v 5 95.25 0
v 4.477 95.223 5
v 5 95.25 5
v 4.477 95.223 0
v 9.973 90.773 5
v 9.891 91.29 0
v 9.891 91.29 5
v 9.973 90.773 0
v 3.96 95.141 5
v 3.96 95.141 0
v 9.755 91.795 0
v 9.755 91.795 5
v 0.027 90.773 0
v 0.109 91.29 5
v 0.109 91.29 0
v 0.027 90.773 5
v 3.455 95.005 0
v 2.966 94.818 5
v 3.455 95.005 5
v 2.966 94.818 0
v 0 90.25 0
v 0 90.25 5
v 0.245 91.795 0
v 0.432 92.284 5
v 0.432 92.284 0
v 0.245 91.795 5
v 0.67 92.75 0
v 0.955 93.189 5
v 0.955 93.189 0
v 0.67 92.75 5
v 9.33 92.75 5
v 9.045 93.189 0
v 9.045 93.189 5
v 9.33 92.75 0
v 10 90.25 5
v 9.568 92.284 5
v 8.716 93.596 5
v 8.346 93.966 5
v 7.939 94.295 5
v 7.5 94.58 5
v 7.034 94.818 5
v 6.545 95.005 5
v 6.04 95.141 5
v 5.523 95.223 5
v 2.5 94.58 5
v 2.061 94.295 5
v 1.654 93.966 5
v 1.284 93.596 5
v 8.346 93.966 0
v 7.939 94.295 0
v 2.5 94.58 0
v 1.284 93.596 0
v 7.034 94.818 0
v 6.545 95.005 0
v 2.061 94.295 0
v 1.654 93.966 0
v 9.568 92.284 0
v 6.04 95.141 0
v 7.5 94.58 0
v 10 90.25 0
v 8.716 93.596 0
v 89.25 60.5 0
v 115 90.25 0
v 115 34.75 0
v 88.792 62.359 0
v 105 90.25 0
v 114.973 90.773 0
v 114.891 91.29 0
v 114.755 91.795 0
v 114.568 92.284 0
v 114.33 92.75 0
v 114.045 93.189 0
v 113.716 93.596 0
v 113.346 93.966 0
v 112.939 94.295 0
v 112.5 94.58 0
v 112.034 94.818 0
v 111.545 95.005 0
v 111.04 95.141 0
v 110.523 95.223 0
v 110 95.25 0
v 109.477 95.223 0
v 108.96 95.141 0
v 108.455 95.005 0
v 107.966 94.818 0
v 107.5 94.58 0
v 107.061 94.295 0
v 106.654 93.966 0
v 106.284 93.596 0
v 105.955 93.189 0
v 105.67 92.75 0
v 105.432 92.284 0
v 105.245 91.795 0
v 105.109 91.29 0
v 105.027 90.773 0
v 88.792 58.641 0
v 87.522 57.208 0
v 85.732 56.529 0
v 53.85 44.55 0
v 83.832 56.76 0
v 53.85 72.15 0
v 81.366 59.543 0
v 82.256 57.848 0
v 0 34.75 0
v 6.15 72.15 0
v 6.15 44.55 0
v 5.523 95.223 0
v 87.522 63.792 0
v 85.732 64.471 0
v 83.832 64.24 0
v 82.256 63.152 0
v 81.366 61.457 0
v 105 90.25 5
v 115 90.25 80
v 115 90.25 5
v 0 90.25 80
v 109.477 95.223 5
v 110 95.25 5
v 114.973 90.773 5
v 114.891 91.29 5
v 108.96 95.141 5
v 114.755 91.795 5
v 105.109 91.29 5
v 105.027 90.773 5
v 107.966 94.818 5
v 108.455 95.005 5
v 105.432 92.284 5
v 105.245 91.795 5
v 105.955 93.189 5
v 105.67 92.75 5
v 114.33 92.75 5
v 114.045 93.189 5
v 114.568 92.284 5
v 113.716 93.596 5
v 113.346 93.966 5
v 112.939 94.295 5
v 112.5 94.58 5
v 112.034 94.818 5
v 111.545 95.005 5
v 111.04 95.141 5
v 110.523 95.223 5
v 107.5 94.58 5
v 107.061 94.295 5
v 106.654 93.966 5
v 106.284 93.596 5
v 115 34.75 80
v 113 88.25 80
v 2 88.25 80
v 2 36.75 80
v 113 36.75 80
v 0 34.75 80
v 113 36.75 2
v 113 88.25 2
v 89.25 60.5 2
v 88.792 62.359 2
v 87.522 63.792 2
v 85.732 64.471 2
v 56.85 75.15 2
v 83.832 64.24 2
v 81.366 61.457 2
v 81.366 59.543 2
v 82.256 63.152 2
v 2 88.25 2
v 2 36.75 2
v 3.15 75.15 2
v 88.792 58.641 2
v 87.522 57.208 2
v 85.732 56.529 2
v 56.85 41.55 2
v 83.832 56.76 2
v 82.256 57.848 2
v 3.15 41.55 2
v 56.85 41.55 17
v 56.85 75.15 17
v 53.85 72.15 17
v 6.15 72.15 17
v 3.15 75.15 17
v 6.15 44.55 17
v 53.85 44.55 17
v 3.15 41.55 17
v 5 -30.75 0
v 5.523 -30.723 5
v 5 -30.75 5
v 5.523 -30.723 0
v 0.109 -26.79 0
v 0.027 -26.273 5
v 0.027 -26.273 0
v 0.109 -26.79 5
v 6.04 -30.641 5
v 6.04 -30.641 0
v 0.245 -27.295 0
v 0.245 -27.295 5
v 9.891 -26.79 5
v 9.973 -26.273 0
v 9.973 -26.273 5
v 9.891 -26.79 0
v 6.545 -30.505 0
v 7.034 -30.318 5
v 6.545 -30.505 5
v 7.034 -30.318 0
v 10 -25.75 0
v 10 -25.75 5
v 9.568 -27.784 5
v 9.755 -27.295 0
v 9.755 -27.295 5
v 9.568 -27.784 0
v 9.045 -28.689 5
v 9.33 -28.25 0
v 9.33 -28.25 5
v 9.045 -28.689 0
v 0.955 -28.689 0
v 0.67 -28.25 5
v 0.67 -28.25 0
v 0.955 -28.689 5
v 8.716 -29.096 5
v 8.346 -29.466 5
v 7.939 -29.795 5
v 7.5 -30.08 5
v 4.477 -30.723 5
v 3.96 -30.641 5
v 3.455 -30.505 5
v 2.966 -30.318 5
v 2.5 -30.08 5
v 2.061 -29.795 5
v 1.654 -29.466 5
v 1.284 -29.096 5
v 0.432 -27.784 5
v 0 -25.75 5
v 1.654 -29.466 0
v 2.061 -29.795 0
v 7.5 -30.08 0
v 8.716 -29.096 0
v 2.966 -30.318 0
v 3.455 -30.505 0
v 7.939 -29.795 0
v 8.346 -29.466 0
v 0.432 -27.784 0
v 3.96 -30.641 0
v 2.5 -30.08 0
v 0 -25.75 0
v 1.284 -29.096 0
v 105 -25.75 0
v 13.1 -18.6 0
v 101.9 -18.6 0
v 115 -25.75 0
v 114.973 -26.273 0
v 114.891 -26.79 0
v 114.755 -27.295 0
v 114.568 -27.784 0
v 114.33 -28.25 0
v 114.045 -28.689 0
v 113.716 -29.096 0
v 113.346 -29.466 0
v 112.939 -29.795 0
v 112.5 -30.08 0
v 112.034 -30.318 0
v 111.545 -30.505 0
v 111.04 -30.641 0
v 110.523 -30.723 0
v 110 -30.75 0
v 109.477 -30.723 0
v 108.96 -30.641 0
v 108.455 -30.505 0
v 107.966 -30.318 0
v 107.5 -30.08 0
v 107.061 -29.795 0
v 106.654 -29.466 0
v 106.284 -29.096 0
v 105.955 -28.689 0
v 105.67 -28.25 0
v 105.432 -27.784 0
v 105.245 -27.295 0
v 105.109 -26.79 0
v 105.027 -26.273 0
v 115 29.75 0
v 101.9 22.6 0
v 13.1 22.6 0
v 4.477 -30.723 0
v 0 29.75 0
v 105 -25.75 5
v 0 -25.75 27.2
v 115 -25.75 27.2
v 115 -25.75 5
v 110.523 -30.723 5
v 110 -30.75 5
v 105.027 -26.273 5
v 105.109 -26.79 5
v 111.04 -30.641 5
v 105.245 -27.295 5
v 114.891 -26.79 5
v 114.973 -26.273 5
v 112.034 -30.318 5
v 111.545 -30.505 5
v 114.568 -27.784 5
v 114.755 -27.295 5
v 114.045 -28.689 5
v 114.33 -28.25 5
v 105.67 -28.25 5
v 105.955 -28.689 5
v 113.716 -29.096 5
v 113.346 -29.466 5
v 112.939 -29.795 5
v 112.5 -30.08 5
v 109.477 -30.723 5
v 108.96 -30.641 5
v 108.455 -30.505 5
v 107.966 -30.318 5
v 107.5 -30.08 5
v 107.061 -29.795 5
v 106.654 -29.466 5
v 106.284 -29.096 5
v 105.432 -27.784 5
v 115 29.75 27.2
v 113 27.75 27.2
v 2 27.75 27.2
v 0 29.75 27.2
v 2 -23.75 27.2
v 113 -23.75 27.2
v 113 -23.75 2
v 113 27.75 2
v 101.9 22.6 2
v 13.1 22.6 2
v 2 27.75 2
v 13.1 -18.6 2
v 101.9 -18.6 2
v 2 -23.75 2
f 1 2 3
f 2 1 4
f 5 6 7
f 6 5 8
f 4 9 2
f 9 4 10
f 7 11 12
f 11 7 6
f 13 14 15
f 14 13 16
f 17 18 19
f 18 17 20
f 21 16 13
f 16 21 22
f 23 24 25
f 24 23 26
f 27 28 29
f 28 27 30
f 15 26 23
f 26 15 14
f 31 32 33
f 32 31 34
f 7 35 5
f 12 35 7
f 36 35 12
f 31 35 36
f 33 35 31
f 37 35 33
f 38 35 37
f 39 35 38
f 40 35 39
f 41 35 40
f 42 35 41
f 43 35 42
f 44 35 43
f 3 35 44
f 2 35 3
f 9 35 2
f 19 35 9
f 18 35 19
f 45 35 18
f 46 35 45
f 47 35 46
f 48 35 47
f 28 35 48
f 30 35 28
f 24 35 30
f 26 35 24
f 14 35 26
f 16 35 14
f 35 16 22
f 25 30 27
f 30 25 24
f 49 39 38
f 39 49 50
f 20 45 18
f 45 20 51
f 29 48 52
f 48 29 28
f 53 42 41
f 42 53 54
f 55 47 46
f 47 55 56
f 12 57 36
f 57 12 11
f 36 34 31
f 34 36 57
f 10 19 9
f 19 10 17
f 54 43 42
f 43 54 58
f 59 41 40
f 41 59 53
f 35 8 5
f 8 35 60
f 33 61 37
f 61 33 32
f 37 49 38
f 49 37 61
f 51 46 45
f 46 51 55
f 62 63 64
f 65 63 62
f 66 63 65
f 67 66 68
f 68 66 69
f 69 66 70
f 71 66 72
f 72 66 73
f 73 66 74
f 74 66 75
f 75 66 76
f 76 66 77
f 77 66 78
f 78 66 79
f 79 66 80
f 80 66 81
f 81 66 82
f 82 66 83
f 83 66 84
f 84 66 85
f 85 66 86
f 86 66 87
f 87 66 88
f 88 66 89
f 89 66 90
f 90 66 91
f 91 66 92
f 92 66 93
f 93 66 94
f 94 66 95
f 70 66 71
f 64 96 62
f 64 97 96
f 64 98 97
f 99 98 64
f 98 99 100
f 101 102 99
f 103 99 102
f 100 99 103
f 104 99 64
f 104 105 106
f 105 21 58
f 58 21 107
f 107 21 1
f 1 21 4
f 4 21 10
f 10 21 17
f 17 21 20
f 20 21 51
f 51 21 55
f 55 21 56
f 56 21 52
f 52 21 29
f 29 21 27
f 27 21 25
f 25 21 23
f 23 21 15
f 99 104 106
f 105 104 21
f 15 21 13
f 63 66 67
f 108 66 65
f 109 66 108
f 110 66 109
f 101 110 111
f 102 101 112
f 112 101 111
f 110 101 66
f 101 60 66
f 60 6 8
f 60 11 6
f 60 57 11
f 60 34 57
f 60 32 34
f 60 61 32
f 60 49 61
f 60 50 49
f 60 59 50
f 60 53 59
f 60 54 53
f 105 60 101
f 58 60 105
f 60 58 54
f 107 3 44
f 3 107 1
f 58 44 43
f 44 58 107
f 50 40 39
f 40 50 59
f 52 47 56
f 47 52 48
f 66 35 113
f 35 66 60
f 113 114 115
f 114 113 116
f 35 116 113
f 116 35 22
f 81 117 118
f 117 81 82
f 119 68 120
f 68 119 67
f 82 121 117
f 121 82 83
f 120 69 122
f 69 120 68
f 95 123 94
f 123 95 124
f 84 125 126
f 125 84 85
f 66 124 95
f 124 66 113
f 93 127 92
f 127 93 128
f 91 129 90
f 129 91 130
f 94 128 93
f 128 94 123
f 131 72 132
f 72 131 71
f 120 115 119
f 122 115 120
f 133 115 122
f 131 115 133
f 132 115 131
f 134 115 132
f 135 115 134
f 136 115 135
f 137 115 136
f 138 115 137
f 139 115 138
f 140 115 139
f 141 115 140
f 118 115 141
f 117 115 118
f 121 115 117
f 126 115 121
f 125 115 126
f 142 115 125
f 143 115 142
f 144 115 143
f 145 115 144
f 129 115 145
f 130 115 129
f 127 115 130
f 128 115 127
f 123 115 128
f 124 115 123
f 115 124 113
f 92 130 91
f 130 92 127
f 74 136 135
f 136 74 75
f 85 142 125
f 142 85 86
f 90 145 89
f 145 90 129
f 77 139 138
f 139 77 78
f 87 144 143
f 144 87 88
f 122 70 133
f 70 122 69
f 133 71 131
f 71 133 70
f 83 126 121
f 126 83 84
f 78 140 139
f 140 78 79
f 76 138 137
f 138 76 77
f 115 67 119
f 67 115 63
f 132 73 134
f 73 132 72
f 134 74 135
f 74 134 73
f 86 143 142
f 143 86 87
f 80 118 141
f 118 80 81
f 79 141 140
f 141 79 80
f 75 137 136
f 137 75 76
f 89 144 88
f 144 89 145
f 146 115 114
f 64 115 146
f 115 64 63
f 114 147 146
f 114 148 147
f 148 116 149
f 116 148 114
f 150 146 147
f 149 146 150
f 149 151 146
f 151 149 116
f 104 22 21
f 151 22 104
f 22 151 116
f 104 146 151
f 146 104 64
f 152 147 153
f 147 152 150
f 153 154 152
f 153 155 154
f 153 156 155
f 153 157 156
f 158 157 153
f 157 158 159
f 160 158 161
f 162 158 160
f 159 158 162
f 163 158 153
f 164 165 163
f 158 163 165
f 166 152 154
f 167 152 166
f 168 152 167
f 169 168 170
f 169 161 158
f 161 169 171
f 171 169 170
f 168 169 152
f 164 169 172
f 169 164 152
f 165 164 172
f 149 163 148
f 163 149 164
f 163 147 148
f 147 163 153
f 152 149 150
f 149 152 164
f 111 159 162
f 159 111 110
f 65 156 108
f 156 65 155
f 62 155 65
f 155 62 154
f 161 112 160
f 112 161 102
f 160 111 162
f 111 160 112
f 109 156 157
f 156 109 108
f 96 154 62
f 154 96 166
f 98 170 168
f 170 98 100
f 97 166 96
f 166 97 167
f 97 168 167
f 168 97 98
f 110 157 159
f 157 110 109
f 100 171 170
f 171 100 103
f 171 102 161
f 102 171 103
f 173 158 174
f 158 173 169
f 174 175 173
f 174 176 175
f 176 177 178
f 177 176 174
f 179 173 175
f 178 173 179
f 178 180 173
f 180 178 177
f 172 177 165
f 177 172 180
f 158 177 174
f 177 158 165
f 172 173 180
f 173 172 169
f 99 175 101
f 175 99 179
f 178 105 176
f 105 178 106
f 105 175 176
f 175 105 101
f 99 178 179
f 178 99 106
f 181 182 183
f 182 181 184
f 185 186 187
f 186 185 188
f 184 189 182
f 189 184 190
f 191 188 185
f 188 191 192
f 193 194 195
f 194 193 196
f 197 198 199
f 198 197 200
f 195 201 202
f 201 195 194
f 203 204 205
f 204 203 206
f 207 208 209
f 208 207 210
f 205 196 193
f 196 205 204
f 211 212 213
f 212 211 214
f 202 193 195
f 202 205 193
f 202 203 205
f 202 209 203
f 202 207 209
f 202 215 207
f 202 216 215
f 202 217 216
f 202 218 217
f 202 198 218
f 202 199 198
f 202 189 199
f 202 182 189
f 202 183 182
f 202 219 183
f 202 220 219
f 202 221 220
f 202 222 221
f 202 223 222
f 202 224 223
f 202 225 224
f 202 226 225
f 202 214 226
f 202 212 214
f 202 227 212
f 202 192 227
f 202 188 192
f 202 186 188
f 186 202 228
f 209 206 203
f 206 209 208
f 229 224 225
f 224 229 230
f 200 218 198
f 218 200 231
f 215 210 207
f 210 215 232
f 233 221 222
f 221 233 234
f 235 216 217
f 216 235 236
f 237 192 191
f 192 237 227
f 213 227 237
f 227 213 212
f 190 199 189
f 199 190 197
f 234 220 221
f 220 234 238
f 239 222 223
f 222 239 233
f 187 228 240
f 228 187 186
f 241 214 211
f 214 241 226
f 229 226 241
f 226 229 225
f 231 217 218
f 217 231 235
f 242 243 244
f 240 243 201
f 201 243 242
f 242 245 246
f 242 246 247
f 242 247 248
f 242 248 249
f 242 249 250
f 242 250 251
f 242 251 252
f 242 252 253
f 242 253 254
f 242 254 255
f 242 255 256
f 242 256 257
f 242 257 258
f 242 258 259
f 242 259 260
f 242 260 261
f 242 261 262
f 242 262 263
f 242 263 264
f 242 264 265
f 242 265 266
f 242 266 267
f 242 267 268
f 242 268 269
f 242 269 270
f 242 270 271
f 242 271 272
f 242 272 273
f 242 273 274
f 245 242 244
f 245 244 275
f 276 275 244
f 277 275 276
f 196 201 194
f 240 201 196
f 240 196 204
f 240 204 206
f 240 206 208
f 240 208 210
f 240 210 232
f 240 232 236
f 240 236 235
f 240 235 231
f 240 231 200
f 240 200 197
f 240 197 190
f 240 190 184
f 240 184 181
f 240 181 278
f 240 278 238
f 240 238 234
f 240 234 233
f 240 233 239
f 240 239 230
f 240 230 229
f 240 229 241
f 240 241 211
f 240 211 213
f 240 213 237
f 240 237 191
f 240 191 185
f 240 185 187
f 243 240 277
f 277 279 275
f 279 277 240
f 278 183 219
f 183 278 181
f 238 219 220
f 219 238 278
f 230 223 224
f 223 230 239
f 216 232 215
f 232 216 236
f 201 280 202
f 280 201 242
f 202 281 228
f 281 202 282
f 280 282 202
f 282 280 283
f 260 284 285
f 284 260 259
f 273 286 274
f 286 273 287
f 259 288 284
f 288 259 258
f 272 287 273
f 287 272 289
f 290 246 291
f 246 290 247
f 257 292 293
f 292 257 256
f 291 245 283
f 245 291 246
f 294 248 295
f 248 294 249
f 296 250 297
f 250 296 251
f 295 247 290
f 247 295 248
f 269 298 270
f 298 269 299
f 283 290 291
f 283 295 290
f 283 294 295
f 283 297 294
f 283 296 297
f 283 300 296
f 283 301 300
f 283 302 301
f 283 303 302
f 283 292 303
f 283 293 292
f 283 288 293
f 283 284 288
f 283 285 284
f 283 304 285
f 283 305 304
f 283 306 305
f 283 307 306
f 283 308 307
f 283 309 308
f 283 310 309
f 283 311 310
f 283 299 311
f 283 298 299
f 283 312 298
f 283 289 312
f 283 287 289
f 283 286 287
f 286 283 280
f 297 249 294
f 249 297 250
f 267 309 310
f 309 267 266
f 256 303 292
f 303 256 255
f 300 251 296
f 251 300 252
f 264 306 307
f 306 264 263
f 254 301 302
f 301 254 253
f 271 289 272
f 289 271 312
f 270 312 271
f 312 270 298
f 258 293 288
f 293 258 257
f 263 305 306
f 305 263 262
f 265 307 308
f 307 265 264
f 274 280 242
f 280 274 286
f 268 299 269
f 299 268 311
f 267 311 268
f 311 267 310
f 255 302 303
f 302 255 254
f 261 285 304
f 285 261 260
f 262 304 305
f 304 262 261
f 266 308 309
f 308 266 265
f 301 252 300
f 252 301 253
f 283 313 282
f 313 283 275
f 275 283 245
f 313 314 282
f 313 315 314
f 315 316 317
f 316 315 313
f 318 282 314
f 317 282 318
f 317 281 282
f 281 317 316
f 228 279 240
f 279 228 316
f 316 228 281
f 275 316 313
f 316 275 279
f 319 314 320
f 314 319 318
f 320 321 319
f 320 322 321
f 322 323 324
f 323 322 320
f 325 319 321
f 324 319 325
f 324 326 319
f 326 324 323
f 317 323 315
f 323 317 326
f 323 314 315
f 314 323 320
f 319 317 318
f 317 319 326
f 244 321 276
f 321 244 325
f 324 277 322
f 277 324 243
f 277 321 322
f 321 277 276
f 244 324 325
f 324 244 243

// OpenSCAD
/* Open SCAD Name.: General_PSU_Cover_v2.scad
*  Copyright (c)..: 2016 www.DIY3DTech.com
*
*  Creation Date..:
*  Description....: PSU end covers
*
*  Rev 1: Base design: drcharlesbell@gmail.com
*  Rev 2: Modifcations by http://www.DIY3DTech.com
*
*  This program is free software; you can redistribute it and/or modify
*  it under the terms of the GNU General Public License as published by
*  the Free Software Foundation; either version 2 of the License, or
*  (at your option) any later version.
*
*  This program is distributed in the hope that it will be useful,
*  but WITHOUT ANY WARRANTY; without even the implied warranty of
*  MERCHANTABILITY or FITNESS FOR A PARTICULAR PURPOSE.  See the
*  GNU General Public License for more details.
*/

// Parts:
// Inlet Male Power Socket with Fuse Switch 10A 250V 3 Pin IEC320 C14
// http://amzn.to/2aMR5ve
//
// 10pcs Terminal Binding Post Power Amplifier Dual 2-way Banana Plug Jack
// http://amzn.to/2biVSaq

/*------------------Customizer View-------------------*/

// preview[view:north, tilt:top]

/*---------------------Parameters---------------------*/

// height of the PSU (add for plastic expansion)
height = 51.5;
// width of the PSU (add for plastic expansion)
width = 111;  
// depth for power-side cover (leave room for switch)
power_side_depth = 80;  //[1:1:100]
// depth for blank-side cover
blank_side_depth = 27.2;  //[1:1:100]
// length of power block
PWR_Block_len = 47.7;   
// height of power block
PWR_Block_height = 27.6;
// 0 = Round Opening 1 = Single Banna Jack 2 = Double Banna Jack
DC_Type = 0; //[0:Single Hole, 1:One Banna Jack Pair, 2:Two Banna Jack Pair]
// Outlet hole for DC power cord DC_Type = 0
DC_power_diameter = 8.0; //[1:1:10]


/*-----------------------Execute----------------------*/

translate ([0,(height/2)+9,0]) power_side();
translate ([0,-(height/2),0]) blank_side();


/*-----------------------Modules----------------------*/


module power_side() {
    
    difference() { //first order differance to add power block support
      
        union() {//start first union
        //create main unit
            difference() {
                union() {//start union second union
                    cube([width+4,height+4,power_side_depth]); 
        
                    //create feet
                    translate([5,(height-1)+5,0]) rotate([0,0,180]) foot();
                    translate([width-1,(height-1)+5,0]) rotate([0,0,180]) foot(); 

                        } //end second union  
             
            //start subtraction of difference
            translate([2,2,2]) cube([width,height,power_side_depth]);
                        
            // start if tree      
                if(DC_Type==0) translate([((((width/2)/2)-(19/2)+11.5))+(width/2),(height/2),-1]) rotate([0,0,0])  cylinder(6,DC_power_diameter/2,DC_power_diameter/2);
                else if(DC_Type==1)   translate([((((width/2)/2)-(19/2)+11.5))+(width/2),(height/2),-1]) rotate([0,0,0]) dual_banna_jack();
                else if(DC_Type==2)    {translate([((((width/2)/2)-(19/2)+11.5))+(width/2),((height/4)+(11.5/2)),-1]) rotate([0,0,0]) dual_banna_jack(); translate([((((width/2)/2)-(19/2)+11.5))+(width/2),(height/2)+(height/4),-1]) rotate([0,0,0]) dual_banna_jack();}
            // end if tree  

        } //end second difference 
            //create inter-support for power block to keep from moving
            translate([(30-((PWR_Block_len+6)/2)),((PWR_Block_height-6)/2)-4,0]) cube([PWR_Block_len+6,PWR_Block_height+6,17]);

  } //end first union 
       // power block cutout from support as well as primary box
        translate([(30-(PWR_Block_len/2)),(PWR_Block_height/2)-4,-1]) cube([PWR_Block_len,PWR_Block_height,22]); 
  
  } //end first difference 
}//end module power_side

module blank_side() {
  difference() {
      
        union() {//start union
            cube([width+4,height+4,blank_side_depth]);
             //create feet
            translate([5,0,0]) rotate([0,0,0]) foot();
            translate([width-1,0,0]) rotate([0,0,0]) foot();   
             } //end union 
             
    //start subtraction of difference
    //create center opening         
    translate([2,2,2]) cube([width,height,blank_side_depth]);
    //remove extra plastic from cover by making a hole 80% of the opening›         
    translate([(((width+4)/2)-((width*0.8)/2)),((height+4)/2)-((height*0.8)/2),-1]) cube([(width*0.8),(height*0.8),blank_side_depth]);
    
  }//end difference
}//end blank_side module

module foot() {
    //create tabed foot
    difference() {
            union() {//start union
                  translate([0,0,0]) rotate([0,0,0]) cylinder(5,10/2,10/2,$fn=60);
                    } //end union
    //start subtraction of difference
                  translate([-5,0,-2.5]) rotate([0,0,0]) cube([10,10,10]);
    } //end difference
}//end foot

module dual_banna_jack() {
    //create tabed foot
    difference() {
            union() {//start union
                  translate([-9.5,0,0]) rotate([0,0,0]) cylinder(10,11.5/2,11.5/2,$fn=60);
                  translate([9.5,0,0]) rotate([0,0,0]) cylinder(10,11.5/2,11.5/2,$fn=60);
                    } //end union
    //start any subtraction of difference below if needed
                 
    }//end difference
}//end foot
/*----------------------End Code----------------------*/
